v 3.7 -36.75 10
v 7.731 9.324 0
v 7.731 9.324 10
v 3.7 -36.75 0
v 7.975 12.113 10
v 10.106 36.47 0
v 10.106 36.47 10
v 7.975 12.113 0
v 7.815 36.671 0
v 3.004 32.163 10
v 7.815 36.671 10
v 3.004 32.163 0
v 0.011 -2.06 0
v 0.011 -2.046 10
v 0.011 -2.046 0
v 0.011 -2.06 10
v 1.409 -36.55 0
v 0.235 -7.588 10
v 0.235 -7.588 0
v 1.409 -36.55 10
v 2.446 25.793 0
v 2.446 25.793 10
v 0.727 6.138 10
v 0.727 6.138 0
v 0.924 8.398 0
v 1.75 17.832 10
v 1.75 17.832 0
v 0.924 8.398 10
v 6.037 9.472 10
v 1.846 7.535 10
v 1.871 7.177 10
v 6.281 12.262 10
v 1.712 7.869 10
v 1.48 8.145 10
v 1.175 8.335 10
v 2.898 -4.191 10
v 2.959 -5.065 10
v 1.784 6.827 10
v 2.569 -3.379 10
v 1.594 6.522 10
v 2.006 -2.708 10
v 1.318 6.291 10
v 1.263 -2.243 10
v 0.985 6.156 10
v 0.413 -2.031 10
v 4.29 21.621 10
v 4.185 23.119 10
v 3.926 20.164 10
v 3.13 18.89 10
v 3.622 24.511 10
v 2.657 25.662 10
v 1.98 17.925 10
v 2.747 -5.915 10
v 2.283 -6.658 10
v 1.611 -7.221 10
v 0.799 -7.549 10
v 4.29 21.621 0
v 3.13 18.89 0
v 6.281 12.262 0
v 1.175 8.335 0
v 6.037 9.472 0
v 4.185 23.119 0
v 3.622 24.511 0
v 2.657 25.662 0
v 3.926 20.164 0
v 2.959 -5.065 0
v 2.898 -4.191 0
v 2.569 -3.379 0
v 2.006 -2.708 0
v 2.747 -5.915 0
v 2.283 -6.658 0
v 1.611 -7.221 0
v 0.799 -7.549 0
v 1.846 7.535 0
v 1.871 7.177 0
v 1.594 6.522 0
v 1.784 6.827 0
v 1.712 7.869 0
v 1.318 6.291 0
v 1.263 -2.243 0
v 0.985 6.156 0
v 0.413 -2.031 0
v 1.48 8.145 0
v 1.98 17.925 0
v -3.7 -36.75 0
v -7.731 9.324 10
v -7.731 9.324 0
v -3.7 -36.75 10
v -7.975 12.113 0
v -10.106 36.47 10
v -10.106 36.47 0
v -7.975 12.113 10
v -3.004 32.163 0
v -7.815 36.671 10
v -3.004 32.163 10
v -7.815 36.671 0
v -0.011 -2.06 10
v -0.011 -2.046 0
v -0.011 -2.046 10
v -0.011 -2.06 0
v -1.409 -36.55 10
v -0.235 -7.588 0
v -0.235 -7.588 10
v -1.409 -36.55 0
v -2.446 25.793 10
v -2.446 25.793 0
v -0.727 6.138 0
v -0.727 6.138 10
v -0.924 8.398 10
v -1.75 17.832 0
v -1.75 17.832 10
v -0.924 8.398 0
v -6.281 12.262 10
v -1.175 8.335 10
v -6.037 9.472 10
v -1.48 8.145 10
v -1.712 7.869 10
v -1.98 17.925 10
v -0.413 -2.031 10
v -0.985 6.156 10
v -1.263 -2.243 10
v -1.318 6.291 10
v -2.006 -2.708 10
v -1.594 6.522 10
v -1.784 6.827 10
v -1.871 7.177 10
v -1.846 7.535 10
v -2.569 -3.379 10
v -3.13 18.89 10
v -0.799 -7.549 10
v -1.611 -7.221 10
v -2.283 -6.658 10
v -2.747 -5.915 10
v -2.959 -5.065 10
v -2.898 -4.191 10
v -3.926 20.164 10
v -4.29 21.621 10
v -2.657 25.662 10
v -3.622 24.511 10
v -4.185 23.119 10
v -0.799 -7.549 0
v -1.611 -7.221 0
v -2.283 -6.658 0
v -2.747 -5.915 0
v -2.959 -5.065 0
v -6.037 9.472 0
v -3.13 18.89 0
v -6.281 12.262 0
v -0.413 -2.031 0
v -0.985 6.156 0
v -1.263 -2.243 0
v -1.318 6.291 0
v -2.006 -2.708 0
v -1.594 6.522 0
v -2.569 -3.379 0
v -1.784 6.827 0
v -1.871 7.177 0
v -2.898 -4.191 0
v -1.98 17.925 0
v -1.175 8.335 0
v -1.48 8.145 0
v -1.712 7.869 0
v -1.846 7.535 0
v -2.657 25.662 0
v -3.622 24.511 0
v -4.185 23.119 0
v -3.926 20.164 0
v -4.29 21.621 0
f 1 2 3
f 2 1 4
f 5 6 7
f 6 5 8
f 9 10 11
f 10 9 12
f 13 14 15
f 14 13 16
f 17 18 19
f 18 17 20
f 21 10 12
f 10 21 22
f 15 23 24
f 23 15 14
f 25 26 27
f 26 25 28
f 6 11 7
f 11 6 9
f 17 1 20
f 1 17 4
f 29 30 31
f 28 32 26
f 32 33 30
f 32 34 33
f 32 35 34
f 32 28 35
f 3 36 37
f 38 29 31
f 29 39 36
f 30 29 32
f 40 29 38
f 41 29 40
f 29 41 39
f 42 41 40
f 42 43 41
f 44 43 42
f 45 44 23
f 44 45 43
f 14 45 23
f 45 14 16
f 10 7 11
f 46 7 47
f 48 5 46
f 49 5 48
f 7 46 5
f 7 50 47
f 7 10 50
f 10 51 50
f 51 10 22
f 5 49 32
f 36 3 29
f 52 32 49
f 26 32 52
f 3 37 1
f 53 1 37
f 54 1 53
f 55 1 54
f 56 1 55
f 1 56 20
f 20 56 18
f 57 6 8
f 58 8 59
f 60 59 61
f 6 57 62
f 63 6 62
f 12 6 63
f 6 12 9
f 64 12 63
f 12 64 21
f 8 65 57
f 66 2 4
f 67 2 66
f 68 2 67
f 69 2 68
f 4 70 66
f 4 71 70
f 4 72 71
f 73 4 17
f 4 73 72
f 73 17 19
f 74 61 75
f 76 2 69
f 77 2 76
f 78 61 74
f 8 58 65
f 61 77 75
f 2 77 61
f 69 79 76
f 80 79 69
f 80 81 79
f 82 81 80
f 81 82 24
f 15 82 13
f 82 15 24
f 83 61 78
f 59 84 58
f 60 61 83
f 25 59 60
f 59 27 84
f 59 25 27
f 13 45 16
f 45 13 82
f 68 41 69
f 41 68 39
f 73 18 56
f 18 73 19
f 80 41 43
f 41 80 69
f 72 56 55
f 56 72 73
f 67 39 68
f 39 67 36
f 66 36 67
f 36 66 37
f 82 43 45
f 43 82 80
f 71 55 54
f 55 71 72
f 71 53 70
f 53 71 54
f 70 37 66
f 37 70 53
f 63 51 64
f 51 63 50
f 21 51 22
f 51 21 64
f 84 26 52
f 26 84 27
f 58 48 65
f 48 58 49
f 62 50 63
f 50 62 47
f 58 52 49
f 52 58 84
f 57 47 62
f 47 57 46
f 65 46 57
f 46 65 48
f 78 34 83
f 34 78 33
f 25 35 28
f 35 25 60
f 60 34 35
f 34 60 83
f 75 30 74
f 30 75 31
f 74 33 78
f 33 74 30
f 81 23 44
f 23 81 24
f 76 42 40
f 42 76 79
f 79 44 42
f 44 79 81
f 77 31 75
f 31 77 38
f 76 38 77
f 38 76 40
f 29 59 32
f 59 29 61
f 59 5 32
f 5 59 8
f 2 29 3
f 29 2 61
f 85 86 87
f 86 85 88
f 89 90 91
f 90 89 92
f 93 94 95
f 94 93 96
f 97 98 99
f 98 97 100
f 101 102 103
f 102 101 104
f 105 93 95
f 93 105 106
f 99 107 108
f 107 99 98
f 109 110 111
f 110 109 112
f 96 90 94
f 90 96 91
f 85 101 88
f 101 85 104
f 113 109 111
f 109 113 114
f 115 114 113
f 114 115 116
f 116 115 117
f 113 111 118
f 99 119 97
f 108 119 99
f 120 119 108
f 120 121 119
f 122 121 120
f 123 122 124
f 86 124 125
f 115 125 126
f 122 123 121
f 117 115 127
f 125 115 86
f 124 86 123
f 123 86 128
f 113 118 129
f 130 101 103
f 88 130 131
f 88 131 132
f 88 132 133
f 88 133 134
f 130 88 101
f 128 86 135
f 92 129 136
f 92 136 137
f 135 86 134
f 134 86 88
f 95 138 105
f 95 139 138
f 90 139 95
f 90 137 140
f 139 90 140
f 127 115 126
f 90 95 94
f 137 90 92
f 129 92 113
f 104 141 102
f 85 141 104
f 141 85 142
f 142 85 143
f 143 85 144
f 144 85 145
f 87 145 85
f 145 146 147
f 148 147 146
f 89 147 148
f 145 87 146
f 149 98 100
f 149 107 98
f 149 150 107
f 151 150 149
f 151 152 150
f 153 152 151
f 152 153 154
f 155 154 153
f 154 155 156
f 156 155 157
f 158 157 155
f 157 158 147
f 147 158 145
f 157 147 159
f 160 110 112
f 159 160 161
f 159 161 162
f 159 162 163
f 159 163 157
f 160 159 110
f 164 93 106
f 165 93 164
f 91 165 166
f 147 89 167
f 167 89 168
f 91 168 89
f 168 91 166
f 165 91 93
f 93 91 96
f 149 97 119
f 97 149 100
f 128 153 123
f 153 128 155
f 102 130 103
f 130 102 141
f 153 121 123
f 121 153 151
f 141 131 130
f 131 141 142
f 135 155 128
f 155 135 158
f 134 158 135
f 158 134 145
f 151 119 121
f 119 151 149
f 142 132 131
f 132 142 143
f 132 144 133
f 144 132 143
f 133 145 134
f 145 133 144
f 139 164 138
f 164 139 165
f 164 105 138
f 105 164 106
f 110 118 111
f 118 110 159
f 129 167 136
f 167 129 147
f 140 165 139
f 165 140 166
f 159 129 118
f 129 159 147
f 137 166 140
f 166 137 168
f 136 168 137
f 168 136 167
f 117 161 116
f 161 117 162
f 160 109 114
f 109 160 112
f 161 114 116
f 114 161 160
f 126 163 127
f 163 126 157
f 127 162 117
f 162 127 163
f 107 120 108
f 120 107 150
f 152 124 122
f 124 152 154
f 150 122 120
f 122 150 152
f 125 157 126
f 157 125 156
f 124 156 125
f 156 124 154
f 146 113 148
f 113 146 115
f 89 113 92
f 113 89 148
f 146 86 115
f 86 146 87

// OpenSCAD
module peg() {
    difference(){
linear_extrude(height=10)
polygon(points=[[0,0],[0,73.5],[2.3,73.5],[6.7,68.59],[6.7,34.25],[2.3,0]],paths=[[0,1,2,3,4,5]]);
translate([6.3,31.5,-2]) cylinder(h = 14, r=2.8, $fn=20);
translate([9.3,58.2,-2]) cylinder(h = 14, r=4.8, $fn=20);
translate([6.8,43.6,-2]) cylinder(h = 14, r=1.15, $fn=20);
translate([0,46.25,-2]) cube([1.7,2.8,14]);
}
};

translate([0,-36.75,0]) union() {
translate([3.7, 0, 0]) rotate([0,0,-5])mirror([1, 0, 0]) peg();
translate([-3.7, 0, 0])rotate([0,0,5])peg();
}
